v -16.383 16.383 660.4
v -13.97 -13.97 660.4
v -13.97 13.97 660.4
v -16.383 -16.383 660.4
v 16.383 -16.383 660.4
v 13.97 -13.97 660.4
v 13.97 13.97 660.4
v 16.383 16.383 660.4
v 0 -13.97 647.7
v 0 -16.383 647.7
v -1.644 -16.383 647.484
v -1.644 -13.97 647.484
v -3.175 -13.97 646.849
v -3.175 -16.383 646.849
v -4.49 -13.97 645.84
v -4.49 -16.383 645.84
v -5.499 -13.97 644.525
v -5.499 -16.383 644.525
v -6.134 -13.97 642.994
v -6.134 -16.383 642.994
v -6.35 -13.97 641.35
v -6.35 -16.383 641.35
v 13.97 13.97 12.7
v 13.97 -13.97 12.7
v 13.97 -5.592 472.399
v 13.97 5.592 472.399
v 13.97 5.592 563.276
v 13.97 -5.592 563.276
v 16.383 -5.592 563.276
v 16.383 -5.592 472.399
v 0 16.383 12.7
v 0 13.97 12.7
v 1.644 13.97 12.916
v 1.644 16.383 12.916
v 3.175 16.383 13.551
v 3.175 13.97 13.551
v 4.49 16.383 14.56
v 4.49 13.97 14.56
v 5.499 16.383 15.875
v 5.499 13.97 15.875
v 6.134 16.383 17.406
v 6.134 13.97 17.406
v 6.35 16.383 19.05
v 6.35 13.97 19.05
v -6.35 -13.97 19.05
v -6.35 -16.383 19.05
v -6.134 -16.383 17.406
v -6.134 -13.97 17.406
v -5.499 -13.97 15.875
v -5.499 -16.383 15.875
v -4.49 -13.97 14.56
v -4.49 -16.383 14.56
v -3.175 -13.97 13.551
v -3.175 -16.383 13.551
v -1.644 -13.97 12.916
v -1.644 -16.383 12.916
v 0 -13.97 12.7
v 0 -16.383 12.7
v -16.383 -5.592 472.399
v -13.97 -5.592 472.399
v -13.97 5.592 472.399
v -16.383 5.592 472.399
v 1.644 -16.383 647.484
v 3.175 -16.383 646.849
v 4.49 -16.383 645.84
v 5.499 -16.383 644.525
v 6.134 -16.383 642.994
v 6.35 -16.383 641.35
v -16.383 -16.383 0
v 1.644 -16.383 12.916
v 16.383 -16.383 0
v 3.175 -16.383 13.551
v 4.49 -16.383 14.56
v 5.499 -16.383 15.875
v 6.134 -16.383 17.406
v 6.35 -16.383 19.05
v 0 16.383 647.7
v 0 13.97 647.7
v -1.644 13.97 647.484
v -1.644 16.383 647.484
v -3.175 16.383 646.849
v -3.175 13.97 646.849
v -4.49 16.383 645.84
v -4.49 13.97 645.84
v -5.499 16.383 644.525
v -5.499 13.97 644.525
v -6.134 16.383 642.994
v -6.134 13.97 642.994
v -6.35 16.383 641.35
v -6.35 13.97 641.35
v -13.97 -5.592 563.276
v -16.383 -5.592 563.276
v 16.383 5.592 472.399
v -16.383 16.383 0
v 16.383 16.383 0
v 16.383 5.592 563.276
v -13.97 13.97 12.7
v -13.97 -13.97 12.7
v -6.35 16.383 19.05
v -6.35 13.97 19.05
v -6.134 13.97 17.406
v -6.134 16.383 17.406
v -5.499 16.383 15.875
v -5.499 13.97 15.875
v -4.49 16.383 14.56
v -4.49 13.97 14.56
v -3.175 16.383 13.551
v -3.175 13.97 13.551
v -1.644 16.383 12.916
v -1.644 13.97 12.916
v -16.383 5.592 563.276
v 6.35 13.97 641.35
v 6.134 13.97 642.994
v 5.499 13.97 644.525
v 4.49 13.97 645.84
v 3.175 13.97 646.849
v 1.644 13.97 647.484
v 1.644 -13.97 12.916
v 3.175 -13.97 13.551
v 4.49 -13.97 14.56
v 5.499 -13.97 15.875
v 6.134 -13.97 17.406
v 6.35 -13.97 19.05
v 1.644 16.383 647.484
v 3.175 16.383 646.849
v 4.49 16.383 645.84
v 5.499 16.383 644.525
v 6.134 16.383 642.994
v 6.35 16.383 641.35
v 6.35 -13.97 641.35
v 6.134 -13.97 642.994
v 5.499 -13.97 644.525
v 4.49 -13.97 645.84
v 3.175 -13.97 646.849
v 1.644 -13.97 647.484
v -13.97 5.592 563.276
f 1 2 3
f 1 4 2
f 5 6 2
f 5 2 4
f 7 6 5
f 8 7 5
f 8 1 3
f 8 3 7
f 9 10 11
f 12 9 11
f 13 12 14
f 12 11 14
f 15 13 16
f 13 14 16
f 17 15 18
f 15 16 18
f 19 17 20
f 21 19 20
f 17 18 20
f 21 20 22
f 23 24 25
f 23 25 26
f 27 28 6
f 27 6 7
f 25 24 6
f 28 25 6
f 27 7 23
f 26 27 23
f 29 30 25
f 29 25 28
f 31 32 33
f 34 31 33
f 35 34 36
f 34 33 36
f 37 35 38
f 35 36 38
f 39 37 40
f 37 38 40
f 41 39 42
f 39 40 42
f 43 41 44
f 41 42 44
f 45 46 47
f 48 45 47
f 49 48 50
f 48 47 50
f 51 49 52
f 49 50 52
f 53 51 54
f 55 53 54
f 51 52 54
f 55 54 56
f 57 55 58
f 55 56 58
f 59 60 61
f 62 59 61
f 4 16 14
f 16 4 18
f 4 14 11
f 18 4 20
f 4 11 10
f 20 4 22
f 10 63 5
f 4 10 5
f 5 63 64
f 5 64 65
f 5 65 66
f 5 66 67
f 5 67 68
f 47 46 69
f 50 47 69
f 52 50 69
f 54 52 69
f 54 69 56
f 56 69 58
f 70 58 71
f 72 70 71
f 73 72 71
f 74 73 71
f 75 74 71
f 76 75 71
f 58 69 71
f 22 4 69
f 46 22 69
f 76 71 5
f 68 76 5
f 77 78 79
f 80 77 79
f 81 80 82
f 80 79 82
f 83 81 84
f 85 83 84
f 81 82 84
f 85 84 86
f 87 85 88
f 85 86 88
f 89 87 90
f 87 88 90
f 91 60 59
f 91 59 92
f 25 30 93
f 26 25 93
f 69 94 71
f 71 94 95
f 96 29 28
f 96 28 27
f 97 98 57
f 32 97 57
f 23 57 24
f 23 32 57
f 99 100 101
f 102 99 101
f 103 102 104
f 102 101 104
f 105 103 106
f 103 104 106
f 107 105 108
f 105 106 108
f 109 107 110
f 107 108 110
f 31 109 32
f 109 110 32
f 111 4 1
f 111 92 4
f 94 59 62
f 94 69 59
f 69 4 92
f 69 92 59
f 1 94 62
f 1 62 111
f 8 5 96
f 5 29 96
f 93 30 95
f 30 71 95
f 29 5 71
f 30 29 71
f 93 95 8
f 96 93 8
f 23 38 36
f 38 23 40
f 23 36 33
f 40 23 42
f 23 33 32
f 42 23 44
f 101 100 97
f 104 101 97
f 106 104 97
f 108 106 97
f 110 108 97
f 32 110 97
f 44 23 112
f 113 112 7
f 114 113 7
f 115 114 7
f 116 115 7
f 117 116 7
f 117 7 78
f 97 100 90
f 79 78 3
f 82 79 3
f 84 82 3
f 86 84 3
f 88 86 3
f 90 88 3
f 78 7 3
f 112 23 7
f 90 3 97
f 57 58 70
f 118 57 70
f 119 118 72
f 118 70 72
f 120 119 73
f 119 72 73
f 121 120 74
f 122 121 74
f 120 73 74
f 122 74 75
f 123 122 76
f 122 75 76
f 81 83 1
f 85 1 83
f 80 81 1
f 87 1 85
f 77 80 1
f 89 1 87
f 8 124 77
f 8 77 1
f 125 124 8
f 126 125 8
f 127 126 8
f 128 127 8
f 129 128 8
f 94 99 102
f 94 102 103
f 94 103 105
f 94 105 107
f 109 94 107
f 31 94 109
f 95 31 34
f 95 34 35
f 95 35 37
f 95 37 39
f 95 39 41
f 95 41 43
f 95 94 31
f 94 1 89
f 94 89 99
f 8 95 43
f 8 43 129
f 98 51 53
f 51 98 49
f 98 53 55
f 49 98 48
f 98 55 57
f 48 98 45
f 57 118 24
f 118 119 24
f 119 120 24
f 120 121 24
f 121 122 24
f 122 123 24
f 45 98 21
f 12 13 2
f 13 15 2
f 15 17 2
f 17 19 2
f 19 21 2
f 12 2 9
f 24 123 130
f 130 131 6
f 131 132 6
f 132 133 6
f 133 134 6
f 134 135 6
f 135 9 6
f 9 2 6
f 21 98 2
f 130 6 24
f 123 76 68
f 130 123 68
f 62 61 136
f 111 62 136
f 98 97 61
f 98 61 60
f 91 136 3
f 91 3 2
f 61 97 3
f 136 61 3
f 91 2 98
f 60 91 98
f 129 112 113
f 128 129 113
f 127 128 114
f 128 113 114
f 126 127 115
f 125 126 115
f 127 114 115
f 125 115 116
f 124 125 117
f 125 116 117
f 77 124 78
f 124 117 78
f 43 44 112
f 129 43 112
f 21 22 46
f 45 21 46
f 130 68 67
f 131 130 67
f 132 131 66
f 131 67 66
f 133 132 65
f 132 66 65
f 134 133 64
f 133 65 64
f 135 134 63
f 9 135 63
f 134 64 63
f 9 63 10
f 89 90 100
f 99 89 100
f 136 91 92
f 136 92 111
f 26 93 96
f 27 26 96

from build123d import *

# Parameters (mm, degrees)
F0_W     = 32.766
F0_H     = 32.766
F1_DEPTH = 660.4
F2_W     = 13.97
F2_H     = 13.97
F3_DEPTH = 647.7
F5_DEPTH = 66.294
F6_W     = 11.1841903999
F6_H     = 90.8770263195
F7_DEPTH = 96.266


with BuildPart() as f1:
    # F0 (on Top) → F1 (new body)
    with BuildSketch(Plane.XY):
        Rectangle(F0_W, F0_H)
    extrude(amount=F1_DEPTH)

    # F2 (on face) → F3 (cut)
    with BuildSketch(Plane.XY.offset(660.4)):
        with Locations((-6.985, 6.985)):
            Rectangle(F2_W, F2_H)
        with Locations((6.985, 6.985)):
            Rectangle(F2_W, F2_H)
        with Locations((6.985, -6.985)):
            Rectangle(F2_W, F2_H)
        with Locations((-6.985, -6.985)):
            Rectangle(F2_W, F2_H)
    extrude(amount=-F3_DEPTH, mode=Mode.SUBTRACT)

    # F4 (on face) → F5 (cut)
    with BuildSketch(Plane.XZ.offset(16.383)):
        with BuildLine():
            Line((0, 25.4), (0, 635))
            ThreePointArc((0, 635), (-4.4901280605, 636.8598719395), (-6.35, 641.35))
            Line((-6.35, 641.35), (-6.35, 19.05))
            ThreePointArc((-6.35, 19.05), (-4.4901280605, 23.5401280605), (0, 25.4))
        make_face()
        with BuildLine():
            Line((0, 635), (0, 647.7))
            ThreePointArc((0, 647.7), (-4.4901280605, 645.8401280605), (-6.35, 641.35))
            ThreePointArc((-6.35, 641.35), (-4.4901280605, 636.8598719395), (0, 635))
        make_face()
        with BuildLine():
            ThreePointArc((6.35, 641.35), (4.4901280605, 645.8401280605), (0, 647.7))
            Line((0, 647.7), (0, 635))
            ThreePointArc((0, 635), (4.4901280605, 636.8598719395), (6.35, 641.35))
        make_face()
        with BuildLine():
            ThreePointArc((6.35, 641.35), (4.4901280605, 636.8598719395), (0, 635))
            Line((0, 635), (0, 25.4))
            ThreePointArc((0, 25.4), (4.4901280605, 23.5401280605), (6.35, 19.05))
            Line((6.35, 19.05), (6.35, 641.35))
        make_face()
        with BuildLine():
            Line((0, 12.7), (0, 25.4))
            ThreePointArc((0, 25.4), (-4.4901280605, 23.5401280605), (-6.35, 19.05))
            ThreePointArc((-6.35, 19.05), (-4.4901280605, 14.5598719395), (0, 12.7))
        make_face()
        with BuildLine():
            ThreePointArc((6.35, 19.05), (4.4901280605, 23.5401280605), (0, 25.4))
            Line((0, 25.4), (0, 12.7))
            ThreePointArc((0, 12.7), (4.4901280605, 14.5598719395), (6.35, 19.05))
        make_face()
    extrude(amount=-F5_DEPTH, mode=Mode.SUBTRACT)

    # F6 (on face) → F7 (cut)
    with BuildSketch(Plane.YZ.offset(16.383)):
        with Locations((0, 517.8375393152)):
            Rectangle(F6_W, F6_H)
    extrude(amount=-F7_DEPTH, mode=Mode.SUBTRACT)


solid = f1.part
